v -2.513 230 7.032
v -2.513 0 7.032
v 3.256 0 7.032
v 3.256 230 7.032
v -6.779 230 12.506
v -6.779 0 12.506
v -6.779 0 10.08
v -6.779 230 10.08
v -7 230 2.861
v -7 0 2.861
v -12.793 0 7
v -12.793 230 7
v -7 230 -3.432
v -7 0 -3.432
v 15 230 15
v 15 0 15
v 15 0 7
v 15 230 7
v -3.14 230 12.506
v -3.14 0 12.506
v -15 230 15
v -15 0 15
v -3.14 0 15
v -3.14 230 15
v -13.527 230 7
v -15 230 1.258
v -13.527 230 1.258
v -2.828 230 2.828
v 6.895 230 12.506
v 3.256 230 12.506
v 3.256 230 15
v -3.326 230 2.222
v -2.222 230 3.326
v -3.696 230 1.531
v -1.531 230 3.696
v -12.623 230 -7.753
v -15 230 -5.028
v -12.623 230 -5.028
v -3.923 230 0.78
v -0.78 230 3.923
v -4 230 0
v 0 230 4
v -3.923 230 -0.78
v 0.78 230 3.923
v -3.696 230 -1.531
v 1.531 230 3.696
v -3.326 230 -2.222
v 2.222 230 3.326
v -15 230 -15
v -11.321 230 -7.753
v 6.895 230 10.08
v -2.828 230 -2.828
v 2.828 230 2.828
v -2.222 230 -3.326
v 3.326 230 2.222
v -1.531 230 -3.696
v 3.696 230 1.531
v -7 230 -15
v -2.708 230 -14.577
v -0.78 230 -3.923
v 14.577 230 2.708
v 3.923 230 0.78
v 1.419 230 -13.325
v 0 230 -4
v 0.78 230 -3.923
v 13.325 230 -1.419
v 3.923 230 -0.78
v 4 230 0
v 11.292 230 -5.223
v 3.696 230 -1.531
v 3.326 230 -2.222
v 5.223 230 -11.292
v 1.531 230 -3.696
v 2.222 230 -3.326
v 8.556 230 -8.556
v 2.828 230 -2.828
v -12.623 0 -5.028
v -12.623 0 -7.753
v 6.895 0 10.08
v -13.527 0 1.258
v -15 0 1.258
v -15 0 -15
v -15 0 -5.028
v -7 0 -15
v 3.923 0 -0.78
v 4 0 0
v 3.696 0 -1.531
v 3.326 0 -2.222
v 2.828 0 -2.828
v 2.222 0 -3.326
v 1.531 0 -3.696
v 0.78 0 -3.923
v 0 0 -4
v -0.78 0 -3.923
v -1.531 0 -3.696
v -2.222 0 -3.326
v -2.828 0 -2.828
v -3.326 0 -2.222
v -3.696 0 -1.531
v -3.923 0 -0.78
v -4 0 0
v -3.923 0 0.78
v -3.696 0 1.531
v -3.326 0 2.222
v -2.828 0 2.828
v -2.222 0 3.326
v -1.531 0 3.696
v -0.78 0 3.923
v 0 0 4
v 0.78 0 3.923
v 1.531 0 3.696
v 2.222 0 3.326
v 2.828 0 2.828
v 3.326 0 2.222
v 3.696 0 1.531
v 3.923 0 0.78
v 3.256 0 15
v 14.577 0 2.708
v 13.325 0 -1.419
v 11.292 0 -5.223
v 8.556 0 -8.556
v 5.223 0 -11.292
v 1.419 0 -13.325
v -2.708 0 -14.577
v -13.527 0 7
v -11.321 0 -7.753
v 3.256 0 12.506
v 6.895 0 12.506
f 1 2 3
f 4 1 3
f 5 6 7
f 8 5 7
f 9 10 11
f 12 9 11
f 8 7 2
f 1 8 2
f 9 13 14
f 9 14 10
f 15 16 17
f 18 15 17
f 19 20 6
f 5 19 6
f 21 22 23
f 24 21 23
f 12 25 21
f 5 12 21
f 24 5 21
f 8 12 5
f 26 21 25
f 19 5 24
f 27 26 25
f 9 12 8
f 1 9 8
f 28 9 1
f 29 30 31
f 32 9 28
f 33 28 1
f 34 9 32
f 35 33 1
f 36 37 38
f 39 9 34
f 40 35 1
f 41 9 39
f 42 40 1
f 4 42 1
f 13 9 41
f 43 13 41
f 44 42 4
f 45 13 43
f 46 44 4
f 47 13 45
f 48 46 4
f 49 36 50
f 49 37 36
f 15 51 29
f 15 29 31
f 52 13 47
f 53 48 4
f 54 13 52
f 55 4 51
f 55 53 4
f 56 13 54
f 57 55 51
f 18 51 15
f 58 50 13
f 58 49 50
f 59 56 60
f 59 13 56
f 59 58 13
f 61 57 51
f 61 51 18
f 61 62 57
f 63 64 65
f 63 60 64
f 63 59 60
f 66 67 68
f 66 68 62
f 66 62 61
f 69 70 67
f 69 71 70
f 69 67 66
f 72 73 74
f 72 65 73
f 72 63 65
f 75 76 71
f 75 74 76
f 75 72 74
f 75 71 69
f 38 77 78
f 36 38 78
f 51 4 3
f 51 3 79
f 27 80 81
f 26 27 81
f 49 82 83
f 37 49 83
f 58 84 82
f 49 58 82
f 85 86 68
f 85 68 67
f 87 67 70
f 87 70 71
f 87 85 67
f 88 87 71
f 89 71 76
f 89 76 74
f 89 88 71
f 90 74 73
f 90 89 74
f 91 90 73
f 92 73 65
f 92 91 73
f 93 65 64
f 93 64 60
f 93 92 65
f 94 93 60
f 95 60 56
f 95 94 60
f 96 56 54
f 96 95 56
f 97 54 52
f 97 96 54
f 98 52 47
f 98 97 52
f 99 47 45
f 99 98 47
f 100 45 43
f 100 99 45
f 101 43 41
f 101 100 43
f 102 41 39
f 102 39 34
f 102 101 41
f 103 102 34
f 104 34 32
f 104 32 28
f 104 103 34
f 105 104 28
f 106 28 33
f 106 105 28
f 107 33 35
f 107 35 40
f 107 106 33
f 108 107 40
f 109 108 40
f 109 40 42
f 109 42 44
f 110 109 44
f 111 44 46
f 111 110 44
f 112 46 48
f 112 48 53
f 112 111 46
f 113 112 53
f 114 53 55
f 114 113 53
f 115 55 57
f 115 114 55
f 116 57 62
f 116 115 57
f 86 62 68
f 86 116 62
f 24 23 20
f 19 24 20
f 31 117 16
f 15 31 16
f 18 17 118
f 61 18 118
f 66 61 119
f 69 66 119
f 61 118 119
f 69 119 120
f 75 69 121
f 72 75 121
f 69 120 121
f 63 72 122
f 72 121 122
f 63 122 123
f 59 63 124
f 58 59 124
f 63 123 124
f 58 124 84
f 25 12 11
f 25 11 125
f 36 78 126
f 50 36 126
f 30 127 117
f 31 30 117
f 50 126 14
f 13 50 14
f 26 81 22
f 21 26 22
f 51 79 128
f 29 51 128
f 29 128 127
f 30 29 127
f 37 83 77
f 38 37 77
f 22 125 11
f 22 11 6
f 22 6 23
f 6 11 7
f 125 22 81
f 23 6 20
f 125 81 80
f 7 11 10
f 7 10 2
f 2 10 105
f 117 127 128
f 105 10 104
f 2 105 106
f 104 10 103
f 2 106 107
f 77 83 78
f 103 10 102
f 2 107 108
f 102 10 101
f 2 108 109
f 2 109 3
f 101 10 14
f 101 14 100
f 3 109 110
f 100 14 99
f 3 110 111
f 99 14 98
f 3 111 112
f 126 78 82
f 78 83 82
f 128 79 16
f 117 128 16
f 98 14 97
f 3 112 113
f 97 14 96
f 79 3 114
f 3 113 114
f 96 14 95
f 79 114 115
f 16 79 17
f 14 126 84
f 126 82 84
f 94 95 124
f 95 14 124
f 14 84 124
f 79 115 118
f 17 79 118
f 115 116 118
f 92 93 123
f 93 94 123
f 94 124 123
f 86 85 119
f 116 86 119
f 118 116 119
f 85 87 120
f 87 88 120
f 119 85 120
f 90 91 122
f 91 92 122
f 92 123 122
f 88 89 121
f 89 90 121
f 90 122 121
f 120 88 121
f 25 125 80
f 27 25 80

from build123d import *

# Parameters (mm, degrees)
CROQUIS1_R              = 4
SALIENTE_EXTRUIR1_DEPTH = 230


with BuildPart() as part:
    # Croquis1 → Saliente-Extruir1 (new body)
    with BuildSketch(Plane(origin=(0, 0, 0), x_dir=(1, 0, 0), z_dir=(0, 1, 0))):
        with BuildLine():
            Line((-7, 15), (-15, 15))
            Line((-15, 15), (-15, 5.027604917))
            Line((-15, 5.027604917), (-12.623437069, 5.027604917))
            Line((-12.623437069, 5.027604917), (-12.623437069, 7.752682341))
            Line((-12.623437069, 7.752682341), (-11.320548438, 7.752682341))
            Line((-11.320548438, 7.752682341), (-7, 3.432133903))
            Line((-7, 3.432133903), (-7, -2.861090311))
            Line((-7, -2.861090311), (-12.793007796, -7))
            Line((-12.793007796, -7), (-13.527286117, -7))
            Line((-13.527286117, -7), (-13.527286117, -1.25796789))
            Line((-13.527286117, -1.25796789), (-15, -1.25796789))
            Line((-15, -1.25796789), (-15, -15))
            Line((-15, -15), (-3.139941254, -15))
            Line((-3.139941254, -15), (-3.139941254, -12.505835019))
            Line((-3.139941254, -12.505835019), (-6.77895709, -12.505835019))
            Line((-6.77895709, -12.505835019), (-6.77895709, -10.079824462))
            Line((-6.77895709, -10.079824462), (-2.512909638, -7.031876702))
            Line((-2.512909638, -7.031876702), (3.25590476, -7.031876702))
            Line((3.25590476, -7.031876702), (6.894920596, -10.079824462))
            Line((6.894920596, -10.079824462), (6.894920596, -12.505835019))
            Line((6.894920596, -12.505835019), (3.25590476, -12.505835019))
            Line((3.25590476, -12.505835019), (3.25590476, -15))
            Line((3.25590476, -15), (15, -15))
            Line((15, -15), (15, -7))
            ThreePointArc((15, -7), (8.556349186, 8.556349186), (-7, 15))
        make_face()
        Circle(CROQUIS1_R, mode=Mode.SUBTRACT)
    extrude(amount=SALIENTE_EXTRUIR1_DEPTH)


solid = part.part
